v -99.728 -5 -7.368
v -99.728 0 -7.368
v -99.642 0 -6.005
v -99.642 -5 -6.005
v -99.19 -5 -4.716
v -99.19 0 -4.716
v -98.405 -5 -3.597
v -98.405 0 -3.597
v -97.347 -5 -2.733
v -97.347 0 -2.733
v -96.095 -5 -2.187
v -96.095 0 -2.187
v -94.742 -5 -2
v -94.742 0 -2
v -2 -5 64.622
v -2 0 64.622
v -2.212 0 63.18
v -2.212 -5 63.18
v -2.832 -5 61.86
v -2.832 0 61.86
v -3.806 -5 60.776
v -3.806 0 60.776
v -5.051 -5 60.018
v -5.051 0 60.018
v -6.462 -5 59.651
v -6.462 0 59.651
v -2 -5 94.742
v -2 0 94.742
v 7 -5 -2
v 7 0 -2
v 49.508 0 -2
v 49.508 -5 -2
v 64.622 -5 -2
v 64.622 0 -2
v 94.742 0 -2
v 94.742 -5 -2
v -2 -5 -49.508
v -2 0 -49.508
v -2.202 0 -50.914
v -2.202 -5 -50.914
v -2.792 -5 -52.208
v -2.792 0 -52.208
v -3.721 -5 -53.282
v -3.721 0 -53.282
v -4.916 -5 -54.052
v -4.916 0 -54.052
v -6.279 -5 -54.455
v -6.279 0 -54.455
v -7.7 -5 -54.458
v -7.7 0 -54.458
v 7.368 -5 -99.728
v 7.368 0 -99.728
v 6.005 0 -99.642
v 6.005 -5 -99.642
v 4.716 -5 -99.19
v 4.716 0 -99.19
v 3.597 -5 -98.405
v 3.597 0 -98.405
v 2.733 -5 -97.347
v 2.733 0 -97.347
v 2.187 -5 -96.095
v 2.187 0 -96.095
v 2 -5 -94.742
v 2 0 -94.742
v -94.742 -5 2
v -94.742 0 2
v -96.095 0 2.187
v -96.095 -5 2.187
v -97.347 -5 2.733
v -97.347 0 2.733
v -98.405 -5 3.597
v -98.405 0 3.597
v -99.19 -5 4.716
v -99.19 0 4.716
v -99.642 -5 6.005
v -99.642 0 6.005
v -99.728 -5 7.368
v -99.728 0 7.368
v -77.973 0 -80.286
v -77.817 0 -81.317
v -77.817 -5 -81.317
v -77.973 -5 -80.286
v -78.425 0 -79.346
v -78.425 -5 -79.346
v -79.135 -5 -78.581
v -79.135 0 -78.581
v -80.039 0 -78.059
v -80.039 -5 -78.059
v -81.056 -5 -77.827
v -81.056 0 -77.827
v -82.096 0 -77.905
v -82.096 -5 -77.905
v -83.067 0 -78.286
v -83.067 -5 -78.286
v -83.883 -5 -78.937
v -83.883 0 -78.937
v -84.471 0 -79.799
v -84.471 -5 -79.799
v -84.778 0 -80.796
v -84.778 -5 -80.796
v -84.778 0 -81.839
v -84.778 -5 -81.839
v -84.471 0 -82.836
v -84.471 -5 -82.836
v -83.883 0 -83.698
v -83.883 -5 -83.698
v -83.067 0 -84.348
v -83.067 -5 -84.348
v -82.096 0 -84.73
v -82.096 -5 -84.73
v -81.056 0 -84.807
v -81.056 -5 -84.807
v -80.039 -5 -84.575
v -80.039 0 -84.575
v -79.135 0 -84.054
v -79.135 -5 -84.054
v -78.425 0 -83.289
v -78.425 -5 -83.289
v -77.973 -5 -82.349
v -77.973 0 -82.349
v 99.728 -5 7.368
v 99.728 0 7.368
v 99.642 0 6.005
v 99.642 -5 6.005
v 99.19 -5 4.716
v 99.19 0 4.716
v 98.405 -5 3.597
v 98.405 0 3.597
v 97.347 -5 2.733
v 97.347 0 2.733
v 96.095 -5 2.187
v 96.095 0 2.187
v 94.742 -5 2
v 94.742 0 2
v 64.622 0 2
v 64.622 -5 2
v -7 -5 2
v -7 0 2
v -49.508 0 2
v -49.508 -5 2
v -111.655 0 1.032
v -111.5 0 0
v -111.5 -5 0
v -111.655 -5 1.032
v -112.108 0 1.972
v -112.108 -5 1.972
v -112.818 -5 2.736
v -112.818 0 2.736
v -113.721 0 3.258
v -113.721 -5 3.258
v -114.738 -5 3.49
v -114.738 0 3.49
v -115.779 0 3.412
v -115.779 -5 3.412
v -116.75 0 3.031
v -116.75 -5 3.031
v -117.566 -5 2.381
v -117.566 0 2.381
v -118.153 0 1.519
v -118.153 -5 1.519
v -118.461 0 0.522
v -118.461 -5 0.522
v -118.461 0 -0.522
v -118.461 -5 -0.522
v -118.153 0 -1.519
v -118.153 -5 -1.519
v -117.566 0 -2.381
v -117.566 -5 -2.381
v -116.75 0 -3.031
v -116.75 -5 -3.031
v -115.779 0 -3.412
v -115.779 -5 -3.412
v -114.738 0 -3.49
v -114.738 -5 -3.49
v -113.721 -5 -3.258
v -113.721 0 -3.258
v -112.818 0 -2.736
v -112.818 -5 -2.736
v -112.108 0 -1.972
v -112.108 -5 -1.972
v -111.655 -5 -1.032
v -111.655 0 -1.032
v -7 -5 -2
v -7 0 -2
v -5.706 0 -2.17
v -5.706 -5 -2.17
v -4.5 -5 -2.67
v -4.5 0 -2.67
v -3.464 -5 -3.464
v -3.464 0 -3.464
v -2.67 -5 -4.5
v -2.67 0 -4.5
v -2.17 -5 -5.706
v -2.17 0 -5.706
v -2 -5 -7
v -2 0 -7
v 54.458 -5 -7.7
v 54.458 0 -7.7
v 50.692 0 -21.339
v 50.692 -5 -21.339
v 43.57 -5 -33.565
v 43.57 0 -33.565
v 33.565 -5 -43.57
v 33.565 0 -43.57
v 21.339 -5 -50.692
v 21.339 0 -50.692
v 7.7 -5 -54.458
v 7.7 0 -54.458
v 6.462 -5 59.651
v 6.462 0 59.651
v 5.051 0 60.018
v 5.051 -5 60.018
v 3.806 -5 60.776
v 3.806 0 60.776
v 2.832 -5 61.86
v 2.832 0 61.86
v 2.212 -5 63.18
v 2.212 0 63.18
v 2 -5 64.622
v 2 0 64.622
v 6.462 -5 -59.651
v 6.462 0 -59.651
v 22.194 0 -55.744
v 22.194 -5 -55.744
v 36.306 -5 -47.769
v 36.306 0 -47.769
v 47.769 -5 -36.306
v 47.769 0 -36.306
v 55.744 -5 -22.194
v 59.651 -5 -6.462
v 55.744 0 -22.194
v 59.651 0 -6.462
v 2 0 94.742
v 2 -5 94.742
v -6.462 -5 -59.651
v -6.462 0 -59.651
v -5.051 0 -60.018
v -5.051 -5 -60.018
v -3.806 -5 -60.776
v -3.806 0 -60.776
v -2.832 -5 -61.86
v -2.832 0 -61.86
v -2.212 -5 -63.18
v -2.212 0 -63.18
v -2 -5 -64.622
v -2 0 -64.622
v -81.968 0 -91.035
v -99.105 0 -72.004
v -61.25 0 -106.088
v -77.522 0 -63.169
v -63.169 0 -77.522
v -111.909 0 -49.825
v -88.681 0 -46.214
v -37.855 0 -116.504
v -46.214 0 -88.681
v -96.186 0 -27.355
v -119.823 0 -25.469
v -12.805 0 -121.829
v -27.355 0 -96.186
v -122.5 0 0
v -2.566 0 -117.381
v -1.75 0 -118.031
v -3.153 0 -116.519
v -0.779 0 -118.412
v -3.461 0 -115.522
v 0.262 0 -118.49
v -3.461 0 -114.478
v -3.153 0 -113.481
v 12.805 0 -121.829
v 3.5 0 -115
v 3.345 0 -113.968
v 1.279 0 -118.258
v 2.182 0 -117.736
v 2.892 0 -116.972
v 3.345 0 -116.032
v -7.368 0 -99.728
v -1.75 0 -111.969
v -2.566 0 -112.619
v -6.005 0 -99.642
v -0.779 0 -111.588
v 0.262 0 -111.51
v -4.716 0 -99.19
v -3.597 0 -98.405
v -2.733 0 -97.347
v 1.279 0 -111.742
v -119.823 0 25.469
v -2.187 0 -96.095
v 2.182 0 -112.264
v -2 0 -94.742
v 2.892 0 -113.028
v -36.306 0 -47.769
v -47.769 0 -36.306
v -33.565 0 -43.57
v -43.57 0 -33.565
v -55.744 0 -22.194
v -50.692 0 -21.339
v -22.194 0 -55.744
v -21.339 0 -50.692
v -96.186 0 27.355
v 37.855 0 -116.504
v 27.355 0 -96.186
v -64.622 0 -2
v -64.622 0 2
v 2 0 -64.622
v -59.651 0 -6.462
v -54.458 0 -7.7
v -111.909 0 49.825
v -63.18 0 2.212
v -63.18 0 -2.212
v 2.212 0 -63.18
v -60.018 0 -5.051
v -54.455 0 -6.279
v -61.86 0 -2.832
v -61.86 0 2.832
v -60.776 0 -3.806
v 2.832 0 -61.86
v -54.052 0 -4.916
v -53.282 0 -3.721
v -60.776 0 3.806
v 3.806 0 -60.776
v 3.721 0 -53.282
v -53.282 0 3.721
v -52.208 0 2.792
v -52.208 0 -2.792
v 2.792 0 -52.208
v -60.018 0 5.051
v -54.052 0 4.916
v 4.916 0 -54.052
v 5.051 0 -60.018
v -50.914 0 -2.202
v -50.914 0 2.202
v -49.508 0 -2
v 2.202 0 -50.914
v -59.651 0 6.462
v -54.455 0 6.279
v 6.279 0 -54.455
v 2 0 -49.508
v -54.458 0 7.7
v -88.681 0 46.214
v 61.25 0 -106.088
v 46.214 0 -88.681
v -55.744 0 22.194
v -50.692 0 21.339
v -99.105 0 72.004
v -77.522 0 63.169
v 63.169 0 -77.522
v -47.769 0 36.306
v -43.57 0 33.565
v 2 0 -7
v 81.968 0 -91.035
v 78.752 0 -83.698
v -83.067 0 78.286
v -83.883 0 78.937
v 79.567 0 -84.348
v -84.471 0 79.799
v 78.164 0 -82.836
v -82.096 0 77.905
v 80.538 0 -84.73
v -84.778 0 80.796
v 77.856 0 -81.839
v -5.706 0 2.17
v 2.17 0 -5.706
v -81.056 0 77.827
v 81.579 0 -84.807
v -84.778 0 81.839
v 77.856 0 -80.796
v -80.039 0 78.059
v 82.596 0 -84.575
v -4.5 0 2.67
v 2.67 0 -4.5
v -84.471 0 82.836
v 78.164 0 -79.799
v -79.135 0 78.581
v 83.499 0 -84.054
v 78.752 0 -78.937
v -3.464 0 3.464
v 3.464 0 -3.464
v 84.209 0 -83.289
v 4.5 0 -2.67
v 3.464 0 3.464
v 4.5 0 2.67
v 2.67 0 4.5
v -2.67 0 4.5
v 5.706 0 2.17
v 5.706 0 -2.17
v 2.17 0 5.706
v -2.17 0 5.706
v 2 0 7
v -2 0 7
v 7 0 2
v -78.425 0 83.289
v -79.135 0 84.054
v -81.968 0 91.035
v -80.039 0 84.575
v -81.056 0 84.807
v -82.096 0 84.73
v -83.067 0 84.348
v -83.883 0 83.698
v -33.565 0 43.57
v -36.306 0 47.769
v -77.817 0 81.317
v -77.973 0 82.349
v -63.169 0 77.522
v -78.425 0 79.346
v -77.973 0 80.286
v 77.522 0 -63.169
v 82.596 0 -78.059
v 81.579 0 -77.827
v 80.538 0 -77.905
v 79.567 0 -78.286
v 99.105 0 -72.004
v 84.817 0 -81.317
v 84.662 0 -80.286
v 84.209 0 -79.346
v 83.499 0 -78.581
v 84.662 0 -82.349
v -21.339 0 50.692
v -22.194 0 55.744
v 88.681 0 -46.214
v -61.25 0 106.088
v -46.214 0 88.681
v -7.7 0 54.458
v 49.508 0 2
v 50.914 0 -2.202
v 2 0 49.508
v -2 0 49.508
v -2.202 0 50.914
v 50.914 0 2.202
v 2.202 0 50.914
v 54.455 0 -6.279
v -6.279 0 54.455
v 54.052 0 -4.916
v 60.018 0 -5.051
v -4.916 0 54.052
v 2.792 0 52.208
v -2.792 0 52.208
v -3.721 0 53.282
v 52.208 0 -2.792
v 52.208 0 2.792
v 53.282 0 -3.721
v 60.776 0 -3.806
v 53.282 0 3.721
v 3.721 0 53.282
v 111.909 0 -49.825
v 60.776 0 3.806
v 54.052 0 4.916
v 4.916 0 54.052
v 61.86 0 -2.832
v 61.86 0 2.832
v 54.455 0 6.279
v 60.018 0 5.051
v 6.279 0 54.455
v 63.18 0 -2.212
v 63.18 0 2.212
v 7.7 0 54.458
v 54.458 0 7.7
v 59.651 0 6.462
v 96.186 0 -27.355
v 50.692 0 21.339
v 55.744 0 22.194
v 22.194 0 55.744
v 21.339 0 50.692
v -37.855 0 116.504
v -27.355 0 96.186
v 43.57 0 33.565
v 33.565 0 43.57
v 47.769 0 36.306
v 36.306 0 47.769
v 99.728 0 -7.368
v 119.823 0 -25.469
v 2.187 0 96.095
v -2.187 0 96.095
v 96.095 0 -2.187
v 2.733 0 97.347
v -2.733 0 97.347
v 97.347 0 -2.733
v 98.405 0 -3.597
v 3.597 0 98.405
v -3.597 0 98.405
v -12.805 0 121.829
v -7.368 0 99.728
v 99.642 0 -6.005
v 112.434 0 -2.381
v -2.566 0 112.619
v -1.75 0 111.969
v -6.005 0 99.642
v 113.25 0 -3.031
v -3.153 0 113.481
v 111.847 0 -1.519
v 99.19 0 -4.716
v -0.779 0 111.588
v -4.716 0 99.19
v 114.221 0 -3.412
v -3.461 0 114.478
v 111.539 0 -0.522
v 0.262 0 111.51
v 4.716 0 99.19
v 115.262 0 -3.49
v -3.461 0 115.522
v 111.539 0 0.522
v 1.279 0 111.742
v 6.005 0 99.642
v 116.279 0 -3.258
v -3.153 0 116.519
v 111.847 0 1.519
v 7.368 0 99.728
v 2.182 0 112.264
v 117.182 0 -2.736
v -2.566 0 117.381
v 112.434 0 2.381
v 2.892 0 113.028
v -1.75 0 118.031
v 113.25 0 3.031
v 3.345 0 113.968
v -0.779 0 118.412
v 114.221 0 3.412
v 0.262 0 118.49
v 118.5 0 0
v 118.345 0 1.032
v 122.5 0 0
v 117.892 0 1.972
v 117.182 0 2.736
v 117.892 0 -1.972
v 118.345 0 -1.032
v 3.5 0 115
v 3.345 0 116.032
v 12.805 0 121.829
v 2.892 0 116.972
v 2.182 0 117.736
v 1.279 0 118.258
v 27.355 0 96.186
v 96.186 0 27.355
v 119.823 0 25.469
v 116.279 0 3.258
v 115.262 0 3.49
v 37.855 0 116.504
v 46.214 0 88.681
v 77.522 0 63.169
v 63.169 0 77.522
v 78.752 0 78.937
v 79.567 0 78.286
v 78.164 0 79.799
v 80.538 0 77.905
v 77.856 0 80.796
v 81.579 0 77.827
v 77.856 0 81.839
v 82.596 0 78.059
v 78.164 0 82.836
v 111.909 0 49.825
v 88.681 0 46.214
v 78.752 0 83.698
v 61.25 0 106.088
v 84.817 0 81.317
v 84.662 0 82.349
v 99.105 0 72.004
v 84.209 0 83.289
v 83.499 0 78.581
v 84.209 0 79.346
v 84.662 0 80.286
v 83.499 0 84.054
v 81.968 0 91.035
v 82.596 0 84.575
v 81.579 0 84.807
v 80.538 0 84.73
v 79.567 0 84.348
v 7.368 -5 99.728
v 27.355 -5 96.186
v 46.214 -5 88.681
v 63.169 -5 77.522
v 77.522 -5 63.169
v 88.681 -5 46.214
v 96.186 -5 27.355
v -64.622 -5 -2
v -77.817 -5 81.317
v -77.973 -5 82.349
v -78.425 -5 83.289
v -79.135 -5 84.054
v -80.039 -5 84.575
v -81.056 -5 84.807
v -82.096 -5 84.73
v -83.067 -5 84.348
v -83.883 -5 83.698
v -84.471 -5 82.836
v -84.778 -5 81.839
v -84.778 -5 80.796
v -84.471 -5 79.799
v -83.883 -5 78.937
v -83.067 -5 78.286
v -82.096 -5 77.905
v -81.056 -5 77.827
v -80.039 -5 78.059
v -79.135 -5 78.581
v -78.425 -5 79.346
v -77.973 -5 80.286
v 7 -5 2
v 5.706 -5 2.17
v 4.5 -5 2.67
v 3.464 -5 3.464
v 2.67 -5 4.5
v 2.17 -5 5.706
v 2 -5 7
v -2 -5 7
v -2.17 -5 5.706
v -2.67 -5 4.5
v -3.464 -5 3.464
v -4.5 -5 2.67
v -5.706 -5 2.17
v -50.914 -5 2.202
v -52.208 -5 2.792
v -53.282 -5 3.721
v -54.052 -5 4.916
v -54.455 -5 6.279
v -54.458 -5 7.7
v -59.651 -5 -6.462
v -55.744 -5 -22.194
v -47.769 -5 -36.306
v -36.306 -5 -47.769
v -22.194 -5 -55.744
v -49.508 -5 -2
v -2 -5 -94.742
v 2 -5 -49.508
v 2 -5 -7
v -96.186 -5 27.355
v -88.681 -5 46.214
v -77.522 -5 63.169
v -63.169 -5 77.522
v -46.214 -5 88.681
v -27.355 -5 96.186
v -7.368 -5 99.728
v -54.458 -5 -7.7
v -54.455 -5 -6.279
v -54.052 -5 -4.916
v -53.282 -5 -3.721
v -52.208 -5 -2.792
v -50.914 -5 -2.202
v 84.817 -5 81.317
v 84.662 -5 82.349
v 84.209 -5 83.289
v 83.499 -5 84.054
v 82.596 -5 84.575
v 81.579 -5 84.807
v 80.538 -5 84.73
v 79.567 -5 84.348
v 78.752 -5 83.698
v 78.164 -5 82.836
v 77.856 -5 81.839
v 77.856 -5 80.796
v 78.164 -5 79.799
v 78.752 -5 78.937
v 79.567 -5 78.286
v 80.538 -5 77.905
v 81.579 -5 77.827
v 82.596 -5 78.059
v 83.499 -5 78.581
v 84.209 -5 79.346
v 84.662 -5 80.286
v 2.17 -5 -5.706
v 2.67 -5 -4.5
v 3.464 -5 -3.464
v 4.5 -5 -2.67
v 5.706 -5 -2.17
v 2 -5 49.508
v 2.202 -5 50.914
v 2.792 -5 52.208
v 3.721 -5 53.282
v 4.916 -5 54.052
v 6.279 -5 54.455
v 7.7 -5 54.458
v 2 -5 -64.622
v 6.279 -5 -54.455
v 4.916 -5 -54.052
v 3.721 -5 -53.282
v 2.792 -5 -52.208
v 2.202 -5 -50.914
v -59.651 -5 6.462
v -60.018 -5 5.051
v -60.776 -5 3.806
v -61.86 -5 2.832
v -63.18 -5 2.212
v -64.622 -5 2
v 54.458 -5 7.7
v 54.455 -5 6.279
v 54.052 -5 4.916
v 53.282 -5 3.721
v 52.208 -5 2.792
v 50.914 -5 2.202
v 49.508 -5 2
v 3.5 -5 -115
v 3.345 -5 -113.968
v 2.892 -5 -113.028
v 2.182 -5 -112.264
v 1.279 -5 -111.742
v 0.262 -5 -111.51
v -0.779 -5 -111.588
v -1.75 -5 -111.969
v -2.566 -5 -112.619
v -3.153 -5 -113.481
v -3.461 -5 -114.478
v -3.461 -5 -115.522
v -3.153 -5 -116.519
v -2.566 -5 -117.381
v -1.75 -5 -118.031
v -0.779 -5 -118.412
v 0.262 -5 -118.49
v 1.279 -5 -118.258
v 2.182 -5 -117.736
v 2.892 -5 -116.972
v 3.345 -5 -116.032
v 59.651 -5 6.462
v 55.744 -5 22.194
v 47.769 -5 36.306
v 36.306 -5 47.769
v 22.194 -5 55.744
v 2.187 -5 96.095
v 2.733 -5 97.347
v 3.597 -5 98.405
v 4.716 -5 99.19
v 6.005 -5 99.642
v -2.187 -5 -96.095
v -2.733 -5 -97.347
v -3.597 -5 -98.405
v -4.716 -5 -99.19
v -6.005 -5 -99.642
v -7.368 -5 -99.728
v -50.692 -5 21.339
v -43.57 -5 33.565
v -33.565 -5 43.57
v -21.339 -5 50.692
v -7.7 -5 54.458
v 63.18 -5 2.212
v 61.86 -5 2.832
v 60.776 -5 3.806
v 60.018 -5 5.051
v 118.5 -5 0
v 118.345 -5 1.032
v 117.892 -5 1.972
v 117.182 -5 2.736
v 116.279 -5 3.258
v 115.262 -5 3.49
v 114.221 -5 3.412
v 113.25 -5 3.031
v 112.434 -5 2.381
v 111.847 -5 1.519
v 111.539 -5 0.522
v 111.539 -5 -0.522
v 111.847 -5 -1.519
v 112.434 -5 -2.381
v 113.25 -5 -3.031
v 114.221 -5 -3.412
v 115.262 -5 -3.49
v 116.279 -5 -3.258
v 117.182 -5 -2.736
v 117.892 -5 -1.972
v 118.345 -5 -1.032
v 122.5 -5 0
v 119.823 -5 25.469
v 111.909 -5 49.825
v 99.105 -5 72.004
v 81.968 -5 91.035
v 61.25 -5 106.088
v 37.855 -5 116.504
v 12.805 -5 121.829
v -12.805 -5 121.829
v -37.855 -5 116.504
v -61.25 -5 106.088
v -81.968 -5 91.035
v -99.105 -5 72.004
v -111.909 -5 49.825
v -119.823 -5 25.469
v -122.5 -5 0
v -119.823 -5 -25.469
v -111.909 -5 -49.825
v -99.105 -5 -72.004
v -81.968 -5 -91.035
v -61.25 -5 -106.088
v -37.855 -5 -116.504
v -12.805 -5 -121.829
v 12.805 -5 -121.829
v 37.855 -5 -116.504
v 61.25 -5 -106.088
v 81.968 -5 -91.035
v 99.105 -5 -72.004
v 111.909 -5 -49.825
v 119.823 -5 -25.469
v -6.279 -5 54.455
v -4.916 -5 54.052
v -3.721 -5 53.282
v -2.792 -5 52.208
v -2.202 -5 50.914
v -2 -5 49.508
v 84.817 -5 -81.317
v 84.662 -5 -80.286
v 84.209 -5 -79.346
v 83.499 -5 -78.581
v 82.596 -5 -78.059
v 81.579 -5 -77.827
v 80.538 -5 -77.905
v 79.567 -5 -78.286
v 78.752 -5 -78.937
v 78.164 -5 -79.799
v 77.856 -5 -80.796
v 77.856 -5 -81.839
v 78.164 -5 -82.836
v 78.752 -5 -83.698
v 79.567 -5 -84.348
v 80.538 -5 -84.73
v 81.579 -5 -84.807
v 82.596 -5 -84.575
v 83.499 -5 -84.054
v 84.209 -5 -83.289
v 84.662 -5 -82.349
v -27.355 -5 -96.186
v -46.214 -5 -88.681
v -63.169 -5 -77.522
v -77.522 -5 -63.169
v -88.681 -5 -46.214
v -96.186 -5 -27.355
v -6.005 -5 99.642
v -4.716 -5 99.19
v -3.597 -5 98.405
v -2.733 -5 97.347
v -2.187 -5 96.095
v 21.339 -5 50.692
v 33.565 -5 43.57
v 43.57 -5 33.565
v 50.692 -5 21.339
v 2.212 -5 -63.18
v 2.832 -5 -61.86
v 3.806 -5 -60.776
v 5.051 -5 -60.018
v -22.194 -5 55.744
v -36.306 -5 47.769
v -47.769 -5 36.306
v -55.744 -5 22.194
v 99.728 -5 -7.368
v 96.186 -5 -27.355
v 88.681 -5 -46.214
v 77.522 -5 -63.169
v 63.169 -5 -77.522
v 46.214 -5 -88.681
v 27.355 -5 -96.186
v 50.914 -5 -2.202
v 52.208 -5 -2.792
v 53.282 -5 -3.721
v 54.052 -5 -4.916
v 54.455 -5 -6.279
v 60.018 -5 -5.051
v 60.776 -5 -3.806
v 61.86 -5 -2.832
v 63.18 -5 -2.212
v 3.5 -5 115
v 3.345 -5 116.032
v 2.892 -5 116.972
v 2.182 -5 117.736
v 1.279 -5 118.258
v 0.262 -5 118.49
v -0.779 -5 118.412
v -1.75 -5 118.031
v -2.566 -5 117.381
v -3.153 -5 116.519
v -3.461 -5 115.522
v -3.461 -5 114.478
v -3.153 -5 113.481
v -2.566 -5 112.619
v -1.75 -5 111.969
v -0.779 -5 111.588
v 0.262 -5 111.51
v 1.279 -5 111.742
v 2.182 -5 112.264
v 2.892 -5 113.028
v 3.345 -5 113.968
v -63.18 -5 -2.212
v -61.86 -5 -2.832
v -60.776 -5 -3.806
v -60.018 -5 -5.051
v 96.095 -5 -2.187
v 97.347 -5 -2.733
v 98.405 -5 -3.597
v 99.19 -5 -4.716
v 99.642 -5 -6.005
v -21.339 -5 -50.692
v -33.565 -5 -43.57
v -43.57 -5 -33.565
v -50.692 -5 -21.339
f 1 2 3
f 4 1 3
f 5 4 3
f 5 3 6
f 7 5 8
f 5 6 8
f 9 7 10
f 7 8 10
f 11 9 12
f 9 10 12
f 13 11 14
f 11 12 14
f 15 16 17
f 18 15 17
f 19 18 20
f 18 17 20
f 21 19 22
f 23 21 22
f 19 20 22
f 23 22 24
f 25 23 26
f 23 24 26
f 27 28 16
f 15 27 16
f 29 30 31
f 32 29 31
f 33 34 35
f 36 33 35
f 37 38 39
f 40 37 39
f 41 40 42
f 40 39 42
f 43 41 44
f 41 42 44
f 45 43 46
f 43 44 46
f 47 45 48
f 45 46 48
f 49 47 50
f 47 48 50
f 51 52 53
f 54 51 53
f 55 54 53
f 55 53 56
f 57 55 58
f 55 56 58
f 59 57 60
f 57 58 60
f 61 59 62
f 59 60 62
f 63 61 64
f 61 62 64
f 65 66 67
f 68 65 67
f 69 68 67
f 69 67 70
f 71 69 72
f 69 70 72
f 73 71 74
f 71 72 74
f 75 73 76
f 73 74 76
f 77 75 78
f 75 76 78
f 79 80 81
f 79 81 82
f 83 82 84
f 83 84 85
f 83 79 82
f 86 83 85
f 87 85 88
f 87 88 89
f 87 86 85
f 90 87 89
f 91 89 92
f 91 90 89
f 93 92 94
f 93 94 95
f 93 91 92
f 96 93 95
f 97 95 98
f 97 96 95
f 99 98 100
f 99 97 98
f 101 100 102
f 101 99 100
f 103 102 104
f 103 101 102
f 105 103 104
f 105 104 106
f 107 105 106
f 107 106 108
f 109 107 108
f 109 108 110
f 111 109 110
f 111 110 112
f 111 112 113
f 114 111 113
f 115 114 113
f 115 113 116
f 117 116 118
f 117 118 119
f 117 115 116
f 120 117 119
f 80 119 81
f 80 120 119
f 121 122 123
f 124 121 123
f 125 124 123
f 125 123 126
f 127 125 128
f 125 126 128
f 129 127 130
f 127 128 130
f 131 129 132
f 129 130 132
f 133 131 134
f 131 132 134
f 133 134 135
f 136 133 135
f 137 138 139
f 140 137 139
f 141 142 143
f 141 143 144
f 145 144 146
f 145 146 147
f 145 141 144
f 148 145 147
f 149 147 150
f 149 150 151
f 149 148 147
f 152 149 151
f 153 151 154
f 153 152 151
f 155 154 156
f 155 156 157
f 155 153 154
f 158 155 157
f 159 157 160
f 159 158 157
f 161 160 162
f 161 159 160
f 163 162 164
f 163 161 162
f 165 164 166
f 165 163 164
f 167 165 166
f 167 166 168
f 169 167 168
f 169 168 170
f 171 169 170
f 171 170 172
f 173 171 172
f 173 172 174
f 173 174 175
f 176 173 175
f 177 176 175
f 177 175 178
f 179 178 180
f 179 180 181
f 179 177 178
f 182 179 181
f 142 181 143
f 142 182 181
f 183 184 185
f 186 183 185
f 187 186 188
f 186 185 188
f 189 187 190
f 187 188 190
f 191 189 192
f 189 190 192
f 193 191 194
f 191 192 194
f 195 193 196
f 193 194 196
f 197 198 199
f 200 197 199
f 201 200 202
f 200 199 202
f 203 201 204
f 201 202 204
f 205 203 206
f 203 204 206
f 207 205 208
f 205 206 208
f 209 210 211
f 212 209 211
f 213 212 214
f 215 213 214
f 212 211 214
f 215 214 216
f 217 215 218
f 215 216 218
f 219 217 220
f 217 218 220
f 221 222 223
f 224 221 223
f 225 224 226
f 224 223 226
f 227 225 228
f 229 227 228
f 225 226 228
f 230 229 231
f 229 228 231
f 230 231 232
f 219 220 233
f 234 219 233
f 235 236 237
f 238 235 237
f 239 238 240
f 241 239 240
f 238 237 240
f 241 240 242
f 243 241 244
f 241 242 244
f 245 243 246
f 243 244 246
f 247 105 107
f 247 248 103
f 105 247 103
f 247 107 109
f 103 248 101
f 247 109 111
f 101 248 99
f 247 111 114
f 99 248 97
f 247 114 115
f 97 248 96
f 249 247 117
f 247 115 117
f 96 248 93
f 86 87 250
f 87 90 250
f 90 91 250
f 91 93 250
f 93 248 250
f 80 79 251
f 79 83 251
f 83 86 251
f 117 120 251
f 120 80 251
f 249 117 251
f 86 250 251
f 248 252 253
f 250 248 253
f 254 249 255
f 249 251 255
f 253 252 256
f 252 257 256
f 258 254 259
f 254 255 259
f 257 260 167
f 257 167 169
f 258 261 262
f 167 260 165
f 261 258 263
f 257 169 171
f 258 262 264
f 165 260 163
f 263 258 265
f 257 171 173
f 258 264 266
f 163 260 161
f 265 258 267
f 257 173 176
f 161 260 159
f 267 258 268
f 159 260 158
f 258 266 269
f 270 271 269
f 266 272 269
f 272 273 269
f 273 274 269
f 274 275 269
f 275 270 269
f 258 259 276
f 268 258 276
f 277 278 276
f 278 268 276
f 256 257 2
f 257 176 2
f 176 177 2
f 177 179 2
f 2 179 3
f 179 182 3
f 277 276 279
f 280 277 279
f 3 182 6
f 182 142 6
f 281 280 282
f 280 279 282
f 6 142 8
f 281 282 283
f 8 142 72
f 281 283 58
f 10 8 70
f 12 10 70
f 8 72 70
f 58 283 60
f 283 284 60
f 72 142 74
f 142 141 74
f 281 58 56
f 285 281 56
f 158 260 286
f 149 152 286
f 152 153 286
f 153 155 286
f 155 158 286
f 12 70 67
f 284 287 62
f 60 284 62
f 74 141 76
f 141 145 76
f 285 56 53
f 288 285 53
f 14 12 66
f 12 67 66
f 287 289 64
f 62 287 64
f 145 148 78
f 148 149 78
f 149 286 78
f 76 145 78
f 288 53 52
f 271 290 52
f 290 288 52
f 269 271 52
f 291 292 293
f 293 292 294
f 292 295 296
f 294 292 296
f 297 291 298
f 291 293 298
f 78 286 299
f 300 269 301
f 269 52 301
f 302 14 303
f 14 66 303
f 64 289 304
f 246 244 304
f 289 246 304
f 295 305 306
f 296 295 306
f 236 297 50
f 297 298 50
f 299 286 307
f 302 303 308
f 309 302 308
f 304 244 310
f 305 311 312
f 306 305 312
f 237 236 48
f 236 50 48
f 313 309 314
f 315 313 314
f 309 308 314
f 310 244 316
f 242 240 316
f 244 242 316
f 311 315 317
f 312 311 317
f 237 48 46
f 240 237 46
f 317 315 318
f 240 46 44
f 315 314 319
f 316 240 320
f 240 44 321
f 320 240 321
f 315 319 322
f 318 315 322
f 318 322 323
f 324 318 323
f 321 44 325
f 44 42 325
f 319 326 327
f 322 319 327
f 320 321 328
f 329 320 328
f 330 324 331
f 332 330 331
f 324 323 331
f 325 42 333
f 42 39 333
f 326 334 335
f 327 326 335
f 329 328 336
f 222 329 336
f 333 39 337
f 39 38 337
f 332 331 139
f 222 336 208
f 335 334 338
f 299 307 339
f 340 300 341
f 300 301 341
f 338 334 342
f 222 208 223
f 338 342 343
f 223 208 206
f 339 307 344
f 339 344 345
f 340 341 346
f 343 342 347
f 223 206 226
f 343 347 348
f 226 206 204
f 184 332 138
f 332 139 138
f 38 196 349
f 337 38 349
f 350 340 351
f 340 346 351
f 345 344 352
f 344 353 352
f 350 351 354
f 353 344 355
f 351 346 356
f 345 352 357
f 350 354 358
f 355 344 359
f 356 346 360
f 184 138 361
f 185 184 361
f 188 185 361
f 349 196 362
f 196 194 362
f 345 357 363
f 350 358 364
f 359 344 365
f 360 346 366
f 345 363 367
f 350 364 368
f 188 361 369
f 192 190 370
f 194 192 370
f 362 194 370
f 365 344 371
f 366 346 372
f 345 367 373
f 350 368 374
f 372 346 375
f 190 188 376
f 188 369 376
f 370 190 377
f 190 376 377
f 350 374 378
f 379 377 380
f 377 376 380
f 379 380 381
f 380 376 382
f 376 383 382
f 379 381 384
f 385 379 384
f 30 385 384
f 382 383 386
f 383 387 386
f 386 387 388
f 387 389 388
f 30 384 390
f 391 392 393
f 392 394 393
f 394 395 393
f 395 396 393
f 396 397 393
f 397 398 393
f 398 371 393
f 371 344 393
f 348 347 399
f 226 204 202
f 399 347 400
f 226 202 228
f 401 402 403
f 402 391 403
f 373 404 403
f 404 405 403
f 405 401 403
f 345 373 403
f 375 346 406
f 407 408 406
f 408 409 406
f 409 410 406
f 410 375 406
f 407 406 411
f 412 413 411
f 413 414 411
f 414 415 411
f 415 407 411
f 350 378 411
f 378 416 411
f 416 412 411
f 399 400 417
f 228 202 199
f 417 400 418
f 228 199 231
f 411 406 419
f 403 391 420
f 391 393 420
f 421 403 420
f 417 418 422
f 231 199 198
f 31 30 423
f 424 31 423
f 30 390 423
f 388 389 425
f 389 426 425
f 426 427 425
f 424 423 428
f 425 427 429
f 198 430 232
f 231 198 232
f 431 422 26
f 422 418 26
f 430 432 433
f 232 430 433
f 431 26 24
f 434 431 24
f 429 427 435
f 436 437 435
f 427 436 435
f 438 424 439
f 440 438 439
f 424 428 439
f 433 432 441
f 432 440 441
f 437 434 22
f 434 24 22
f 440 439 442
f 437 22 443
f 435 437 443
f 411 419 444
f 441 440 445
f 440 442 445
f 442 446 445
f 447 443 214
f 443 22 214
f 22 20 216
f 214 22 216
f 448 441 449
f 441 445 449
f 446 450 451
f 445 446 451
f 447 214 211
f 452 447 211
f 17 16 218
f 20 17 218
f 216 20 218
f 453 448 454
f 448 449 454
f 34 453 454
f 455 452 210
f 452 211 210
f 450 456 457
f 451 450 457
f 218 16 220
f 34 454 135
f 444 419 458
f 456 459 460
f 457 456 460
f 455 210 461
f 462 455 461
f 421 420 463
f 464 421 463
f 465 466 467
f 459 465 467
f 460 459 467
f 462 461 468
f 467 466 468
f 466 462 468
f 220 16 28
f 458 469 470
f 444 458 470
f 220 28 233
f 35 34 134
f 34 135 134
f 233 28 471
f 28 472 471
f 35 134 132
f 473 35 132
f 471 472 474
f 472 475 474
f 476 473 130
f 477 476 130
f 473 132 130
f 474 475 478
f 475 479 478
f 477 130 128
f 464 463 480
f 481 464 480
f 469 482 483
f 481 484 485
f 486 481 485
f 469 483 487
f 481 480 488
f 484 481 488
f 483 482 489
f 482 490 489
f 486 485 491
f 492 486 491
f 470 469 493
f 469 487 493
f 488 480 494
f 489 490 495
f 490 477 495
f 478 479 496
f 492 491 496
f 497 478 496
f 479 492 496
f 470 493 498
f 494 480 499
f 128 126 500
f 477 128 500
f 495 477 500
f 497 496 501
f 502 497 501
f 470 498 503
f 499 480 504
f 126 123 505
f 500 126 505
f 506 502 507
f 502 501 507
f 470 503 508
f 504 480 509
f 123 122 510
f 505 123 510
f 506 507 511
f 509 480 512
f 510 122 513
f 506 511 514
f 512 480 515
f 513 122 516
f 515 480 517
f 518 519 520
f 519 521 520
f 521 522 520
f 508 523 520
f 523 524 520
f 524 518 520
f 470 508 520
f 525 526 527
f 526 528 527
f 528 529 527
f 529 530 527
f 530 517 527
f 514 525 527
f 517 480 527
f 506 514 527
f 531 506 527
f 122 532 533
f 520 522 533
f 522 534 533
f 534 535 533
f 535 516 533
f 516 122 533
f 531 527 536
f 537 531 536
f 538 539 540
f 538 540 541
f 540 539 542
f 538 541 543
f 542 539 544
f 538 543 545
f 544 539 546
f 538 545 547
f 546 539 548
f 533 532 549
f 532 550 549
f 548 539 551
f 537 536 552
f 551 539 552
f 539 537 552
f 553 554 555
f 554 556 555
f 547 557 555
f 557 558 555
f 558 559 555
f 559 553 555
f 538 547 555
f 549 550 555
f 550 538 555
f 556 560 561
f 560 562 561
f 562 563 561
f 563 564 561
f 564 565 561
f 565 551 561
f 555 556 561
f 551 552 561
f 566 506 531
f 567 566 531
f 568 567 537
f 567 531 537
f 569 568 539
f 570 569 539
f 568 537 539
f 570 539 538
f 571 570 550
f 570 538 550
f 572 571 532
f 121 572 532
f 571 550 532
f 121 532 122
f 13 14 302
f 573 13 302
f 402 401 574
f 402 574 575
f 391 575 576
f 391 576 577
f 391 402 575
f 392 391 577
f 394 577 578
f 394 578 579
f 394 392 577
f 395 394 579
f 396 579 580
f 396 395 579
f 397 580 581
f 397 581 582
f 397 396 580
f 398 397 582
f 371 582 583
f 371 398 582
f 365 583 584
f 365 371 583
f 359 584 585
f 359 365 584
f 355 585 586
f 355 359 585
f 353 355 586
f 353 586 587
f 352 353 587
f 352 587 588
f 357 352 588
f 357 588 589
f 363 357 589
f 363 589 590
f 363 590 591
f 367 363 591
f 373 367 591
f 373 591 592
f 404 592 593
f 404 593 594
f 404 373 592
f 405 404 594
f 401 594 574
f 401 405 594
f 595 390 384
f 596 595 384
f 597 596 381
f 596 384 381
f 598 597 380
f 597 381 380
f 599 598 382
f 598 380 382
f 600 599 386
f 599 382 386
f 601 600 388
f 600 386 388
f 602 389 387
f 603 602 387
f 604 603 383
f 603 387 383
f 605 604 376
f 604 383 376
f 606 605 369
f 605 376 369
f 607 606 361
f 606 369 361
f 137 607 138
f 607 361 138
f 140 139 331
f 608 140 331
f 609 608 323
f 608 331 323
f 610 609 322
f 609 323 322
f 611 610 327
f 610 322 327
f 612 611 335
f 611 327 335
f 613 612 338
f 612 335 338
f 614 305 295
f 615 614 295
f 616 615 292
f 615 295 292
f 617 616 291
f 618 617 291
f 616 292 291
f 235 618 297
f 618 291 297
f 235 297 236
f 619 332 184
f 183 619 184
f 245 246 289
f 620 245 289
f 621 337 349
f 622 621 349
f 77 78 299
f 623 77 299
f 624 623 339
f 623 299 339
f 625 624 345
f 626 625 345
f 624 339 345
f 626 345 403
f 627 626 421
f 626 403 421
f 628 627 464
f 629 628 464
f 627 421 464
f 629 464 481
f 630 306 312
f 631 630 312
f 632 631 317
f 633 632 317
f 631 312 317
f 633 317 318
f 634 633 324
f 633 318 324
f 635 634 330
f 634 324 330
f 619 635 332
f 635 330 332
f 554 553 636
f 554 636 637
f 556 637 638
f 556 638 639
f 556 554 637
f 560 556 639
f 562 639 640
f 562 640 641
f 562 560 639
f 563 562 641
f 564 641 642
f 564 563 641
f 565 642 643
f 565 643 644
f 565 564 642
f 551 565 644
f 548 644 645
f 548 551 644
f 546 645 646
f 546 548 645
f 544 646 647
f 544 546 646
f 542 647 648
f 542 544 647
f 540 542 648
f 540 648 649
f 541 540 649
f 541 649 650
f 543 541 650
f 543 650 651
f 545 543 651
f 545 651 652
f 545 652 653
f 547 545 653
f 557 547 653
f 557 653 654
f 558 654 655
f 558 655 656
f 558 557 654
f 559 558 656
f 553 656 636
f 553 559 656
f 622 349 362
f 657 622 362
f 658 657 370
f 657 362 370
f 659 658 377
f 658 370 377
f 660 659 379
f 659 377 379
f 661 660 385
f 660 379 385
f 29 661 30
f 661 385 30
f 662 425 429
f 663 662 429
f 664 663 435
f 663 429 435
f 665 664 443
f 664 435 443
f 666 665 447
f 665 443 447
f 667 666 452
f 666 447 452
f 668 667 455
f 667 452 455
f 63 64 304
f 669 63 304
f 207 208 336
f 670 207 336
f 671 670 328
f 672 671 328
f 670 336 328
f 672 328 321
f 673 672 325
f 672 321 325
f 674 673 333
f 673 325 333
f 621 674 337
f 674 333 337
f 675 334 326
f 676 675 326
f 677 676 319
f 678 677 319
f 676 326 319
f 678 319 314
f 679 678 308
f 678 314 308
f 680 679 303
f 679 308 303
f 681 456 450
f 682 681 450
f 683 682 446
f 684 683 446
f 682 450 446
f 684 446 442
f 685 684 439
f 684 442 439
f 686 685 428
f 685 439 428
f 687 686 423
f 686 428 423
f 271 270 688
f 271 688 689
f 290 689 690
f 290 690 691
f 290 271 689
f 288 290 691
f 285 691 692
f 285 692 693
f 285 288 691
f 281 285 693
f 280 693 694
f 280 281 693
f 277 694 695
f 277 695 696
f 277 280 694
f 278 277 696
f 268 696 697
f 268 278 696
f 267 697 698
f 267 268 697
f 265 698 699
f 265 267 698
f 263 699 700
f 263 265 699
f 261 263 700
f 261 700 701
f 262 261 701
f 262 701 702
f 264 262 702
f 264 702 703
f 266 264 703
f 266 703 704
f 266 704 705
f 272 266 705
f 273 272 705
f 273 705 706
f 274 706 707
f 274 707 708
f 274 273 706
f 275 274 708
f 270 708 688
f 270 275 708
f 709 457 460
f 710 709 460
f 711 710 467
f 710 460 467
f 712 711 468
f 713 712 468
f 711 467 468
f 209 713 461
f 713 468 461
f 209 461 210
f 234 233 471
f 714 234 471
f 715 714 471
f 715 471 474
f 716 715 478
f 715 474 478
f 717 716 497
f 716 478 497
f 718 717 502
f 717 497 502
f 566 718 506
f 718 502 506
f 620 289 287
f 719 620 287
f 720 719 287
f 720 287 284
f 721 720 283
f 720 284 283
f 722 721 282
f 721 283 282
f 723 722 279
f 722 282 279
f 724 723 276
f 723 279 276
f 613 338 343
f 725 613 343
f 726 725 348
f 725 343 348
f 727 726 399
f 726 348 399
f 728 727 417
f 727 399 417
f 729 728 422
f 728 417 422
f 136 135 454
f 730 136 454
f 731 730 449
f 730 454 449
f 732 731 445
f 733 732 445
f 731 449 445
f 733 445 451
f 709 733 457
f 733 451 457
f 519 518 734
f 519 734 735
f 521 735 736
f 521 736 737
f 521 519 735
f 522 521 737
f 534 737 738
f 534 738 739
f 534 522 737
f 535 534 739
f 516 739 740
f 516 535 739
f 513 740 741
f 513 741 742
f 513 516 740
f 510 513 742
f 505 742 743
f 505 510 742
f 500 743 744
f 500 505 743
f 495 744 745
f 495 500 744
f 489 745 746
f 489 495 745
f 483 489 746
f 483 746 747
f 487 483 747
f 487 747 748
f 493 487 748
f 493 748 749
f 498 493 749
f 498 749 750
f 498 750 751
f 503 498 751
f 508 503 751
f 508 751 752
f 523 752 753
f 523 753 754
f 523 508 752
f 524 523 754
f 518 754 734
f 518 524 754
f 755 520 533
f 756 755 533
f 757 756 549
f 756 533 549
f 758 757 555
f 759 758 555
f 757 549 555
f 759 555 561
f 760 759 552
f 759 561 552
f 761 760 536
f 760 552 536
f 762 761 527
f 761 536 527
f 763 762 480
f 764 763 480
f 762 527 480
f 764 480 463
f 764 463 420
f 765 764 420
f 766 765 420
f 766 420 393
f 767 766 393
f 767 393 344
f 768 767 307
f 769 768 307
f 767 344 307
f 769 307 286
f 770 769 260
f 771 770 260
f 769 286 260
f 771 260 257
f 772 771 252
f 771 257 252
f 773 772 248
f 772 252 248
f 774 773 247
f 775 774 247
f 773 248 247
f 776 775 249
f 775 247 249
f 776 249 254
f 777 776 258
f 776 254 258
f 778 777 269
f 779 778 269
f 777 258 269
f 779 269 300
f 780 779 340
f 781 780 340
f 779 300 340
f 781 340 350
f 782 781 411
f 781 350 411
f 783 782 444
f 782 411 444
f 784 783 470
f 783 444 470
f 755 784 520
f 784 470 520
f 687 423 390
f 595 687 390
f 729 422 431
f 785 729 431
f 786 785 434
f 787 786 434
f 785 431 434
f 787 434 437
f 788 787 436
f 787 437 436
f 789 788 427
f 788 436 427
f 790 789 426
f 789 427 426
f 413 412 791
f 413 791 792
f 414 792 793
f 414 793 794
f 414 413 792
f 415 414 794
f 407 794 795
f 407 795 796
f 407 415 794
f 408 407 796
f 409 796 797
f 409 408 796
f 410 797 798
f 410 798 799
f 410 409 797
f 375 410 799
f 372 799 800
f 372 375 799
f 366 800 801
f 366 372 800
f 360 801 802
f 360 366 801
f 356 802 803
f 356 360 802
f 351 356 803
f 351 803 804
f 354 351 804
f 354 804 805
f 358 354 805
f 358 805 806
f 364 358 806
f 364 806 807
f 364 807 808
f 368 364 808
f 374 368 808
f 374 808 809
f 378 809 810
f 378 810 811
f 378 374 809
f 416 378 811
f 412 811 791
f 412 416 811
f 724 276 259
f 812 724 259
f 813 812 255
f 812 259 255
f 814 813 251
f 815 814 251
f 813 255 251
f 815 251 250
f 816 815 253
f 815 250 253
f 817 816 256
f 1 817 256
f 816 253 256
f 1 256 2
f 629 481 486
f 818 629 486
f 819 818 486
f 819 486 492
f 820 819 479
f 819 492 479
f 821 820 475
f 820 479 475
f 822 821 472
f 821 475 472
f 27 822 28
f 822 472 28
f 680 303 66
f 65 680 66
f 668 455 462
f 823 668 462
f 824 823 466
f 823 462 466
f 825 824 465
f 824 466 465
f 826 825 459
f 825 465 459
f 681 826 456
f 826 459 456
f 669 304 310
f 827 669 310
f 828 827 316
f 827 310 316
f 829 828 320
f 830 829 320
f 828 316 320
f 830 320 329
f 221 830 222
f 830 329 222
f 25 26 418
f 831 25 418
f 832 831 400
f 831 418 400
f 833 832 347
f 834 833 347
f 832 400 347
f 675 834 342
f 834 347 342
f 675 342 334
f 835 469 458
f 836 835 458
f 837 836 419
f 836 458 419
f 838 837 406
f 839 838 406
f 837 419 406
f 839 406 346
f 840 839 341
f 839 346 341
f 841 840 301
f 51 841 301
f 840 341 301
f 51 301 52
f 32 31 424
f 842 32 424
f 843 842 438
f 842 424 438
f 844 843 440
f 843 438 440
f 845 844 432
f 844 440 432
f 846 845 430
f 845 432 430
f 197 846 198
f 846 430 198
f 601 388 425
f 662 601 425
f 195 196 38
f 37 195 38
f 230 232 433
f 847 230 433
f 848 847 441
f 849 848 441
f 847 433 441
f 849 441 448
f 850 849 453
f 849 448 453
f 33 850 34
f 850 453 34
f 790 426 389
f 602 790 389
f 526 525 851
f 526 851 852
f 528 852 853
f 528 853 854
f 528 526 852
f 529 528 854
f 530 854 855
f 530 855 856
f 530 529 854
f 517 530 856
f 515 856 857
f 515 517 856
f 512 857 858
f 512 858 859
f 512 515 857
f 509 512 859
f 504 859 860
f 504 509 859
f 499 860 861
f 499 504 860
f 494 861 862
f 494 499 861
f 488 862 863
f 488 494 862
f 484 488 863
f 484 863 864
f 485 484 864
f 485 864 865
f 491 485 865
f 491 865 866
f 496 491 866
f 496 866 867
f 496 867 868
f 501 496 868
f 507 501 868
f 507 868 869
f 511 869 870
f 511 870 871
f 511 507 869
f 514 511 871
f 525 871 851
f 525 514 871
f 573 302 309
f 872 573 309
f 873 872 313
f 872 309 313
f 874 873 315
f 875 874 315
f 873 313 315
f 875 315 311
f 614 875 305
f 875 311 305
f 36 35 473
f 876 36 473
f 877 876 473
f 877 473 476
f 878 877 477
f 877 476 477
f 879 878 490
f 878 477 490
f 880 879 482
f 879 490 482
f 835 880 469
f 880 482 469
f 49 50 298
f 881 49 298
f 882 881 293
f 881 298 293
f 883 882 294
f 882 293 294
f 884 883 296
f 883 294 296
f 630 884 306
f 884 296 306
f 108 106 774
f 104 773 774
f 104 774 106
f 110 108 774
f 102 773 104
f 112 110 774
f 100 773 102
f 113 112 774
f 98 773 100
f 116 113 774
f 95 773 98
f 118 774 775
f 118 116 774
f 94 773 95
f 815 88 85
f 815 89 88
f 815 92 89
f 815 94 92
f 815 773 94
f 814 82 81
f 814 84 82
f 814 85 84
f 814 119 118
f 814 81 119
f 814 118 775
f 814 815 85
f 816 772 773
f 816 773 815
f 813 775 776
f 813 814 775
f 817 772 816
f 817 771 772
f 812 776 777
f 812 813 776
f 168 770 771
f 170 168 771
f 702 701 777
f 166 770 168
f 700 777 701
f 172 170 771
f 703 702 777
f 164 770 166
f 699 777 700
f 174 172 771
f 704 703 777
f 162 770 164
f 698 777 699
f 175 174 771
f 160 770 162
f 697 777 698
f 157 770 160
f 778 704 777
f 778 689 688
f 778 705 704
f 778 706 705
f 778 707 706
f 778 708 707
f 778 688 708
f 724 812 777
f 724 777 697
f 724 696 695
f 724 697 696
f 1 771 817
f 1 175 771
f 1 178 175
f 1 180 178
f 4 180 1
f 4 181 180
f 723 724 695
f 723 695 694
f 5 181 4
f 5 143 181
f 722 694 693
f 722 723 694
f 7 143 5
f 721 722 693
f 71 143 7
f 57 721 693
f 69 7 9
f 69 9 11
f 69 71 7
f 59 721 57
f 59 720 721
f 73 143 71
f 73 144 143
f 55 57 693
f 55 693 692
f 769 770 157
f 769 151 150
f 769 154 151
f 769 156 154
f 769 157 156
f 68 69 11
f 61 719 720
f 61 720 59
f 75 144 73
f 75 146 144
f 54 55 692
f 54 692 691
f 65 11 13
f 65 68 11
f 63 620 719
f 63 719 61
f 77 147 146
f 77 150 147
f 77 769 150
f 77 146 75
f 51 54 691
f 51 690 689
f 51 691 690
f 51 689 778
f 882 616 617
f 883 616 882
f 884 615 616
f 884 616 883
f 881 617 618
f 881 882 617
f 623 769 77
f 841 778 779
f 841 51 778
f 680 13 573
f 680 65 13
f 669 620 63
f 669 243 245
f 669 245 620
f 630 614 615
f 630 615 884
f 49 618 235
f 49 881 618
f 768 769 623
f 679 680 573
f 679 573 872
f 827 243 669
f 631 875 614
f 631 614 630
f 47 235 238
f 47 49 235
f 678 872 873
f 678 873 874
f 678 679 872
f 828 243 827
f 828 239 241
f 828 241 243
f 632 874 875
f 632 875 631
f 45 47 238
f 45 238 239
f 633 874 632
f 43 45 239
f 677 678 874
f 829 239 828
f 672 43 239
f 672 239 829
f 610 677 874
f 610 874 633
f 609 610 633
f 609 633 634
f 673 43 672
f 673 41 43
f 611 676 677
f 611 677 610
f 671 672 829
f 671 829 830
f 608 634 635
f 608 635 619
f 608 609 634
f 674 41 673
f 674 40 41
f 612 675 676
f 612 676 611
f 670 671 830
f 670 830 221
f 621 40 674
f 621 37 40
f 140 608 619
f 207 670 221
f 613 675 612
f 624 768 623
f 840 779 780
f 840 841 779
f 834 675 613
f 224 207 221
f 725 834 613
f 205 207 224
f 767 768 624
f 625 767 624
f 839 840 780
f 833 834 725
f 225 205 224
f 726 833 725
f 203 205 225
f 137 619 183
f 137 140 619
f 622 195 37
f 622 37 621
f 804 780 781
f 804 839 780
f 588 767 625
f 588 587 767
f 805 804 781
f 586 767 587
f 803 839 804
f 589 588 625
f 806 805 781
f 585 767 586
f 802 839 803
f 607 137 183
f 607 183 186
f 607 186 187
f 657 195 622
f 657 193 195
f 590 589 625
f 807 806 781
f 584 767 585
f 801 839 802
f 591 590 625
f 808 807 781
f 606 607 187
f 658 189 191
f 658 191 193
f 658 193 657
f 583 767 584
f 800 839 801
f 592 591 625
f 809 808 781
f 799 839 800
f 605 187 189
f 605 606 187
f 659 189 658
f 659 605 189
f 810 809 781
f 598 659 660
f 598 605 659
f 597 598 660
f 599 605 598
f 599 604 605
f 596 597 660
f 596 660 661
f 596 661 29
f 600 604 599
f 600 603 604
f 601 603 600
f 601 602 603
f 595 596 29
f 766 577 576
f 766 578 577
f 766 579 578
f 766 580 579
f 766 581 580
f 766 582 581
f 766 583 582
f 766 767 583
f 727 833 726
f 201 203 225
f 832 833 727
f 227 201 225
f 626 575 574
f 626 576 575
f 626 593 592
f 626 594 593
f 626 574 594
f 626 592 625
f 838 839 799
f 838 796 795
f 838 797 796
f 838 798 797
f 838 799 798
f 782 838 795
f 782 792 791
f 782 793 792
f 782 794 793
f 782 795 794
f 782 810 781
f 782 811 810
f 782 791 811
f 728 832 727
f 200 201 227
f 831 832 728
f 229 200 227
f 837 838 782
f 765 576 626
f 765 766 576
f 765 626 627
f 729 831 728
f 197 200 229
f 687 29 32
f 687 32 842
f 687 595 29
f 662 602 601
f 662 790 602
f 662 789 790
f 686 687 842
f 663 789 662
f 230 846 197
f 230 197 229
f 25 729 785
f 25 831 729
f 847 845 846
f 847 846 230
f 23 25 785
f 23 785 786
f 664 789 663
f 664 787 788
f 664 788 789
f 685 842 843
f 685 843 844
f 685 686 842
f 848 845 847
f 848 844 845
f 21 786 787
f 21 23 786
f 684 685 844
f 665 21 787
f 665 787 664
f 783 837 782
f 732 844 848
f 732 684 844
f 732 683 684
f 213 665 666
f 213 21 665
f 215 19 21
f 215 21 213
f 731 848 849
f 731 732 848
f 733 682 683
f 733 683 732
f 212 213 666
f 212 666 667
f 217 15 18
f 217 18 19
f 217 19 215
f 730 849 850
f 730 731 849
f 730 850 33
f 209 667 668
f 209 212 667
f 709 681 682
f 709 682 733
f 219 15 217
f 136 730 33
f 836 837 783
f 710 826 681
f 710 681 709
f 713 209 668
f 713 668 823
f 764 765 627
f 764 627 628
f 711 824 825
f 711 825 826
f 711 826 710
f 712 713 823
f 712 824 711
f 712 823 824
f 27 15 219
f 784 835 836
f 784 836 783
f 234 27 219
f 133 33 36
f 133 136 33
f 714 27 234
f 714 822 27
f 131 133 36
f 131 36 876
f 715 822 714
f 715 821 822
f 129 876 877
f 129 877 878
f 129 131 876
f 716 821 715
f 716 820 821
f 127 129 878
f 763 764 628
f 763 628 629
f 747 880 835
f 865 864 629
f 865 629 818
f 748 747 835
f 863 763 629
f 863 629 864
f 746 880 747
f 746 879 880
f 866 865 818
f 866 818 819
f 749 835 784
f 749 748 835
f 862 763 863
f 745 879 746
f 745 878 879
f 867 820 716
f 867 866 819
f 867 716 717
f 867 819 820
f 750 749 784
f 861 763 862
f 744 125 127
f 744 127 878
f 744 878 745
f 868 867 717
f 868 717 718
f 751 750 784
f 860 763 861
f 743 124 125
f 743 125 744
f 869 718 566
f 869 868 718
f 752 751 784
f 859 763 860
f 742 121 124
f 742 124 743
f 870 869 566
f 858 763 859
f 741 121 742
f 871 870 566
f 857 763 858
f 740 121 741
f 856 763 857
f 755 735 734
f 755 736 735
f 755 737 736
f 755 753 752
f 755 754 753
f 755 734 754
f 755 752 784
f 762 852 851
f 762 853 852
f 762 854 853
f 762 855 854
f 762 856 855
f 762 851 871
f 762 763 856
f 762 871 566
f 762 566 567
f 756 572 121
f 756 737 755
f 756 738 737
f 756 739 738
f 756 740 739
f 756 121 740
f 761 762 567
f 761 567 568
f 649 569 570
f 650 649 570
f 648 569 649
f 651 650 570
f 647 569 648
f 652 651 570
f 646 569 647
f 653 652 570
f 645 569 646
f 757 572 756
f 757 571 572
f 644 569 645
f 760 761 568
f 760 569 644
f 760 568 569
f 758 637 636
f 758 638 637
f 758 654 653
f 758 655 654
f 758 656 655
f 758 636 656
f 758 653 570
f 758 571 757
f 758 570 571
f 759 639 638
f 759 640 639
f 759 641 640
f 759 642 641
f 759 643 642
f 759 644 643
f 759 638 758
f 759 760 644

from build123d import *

# Parameters (mm, degrees)
F0_R     = 122.5
F0_R_2   = 3.5
F1_DEPTH = 5


# Not quite as in the source:
# - a feature names something its author has since deleted; it is built from what else it names


with BuildPart() as f1:
    # F0 (on Front) → F1 (new body)
    with BuildSketch(Plane.XZ):
        Circle(F0_R)
        with Locations((-81.3172798365, -81.3172798365)):
            Circle(F0_R_2, mode=Mode.SUBTRACT)
        with BuildLine():
            ThreePointArc((-99.7281623775, -7.3684210526), (-98.4052297439, -3.5972147631), (-94.7417542586, -2))
            Line((-94.7417542586, -2), (-64.6219776856, -2))
            ThreePointArc((-64.6219776856, -2), (-61.2822402478, -3.2789579623), (-59.6510563252, -6.4615384615))
            ThreePointArc((-59.6510563252, -6.4615384615), (-42.4264068712, -42.4264068712), (-6.4615384615, -59.6510563252))
            ThreePointArc((-6.4615384615, -59.6510563252), (-3.2789579623, -61.2822402478), (-2, -64.6219776856))
            Line((-2, -64.6219776856), (-2, -94.7417542586))
            ThreePointArc((-2, -94.7417542586), (-3.5972147631, -98.4052297439), (-7.3684210526, -99.7281623775))
            ThreePointArc((-7.3684210526, -99.7281623775), (-70.7106781187, -70.7106781187), (-99.7281623775, -7.3684210526))
        make_face(mode=Mode.SUBTRACT)
        with BuildLine():
            ThreePointArc((-7, -2), (-3.4644660941, -3.4644660941), (-2, -7))
            Line((-2, -7), (-2, -49.5075751779))
            ThreePointArc((-2, -49.5075751779), (-3.7212807378, -53.2824923956), (-7.7, -54.4583326957))
            ThreePointArc((-7.7, -54.4583326957), (-38.8908729653, -38.8908729653), (-54.4583326957, -7.7))
            ThreePointArc((-54.4583326957, -7.7), (-53.2824923956, -3.7212807378), (-49.5075751779, -2))
            Line((-49.5075751779, -2), (-7, -2))
        make_face(mode=Mode.SUBTRACT)
        with Locations((0, -115)):
            Circle(F0_R_2, mode=Mode.SUBTRACT)
        with Locations((81.3172798365, -81.3172798365)):
            Circle(F0_R_2, mode=Mode.SUBTRACT)
        with BuildLine():
            ThreePointArc((99.7281623775, -7.3684210526), (70.7106781187, -70.7106781187), (7.3684210526, -99.7281623775))
            ThreePointArc((7.3684210526, -99.7281623775), (3.5972147631, -98.4052297439), (2, -94.7417542586))
            Line((2, -94.7417542586), (2, -64.6219776856))
            ThreePointArc((2, -64.6219776856), (3.2789579623, -61.2822402478), (6.4615384615, -59.6510563252))
            ThreePointArc((6.4615384615, -59.6510563252), (42.4264068712, -42.4264068712), (59.6510563252, -6.4615384615))
            ThreePointArc((59.6510563252, -6.4615384615), (61.2822402478, -3.2789579623), (64.6219776856, -2))
            Line((64.6219776856, -2), (94.7417542586, -2))
            ThreePointArc((94.7417542586, -2), (98.4052297439, -3.5972147631), (99.7281623775, -7.3684210526))
        make_face(mode=Mode.SUBTRACT)
        with BuildLine():
            Line((2, -49.5075751779), (2, -7))
            ThreePointArc((2, -7), (3.4644660941, -3.4644660941), (7, -2))
            Line((7, -2), (49.5075751779, -2))
            ThreePointArc((49.5075751779, -2), (53.2824923956, -3.7212807378), (54.4583326957, -7.7))
            ThreePointArc((54.4583326957, -7.7), (38.8908729653, -38.8908729653), (7.7, -54.4583326957))
            ThreePointArc((7.7, -54.4583326957), (3.7212807378, -53.2824923956), (2, -49.5075751779))
        make_face(mode=Mode.SUBTRACT)
        with Locations((-115, 0)):
            Circle(F0_R_2, mode=Mode.SUBTRACT)
        with BuildLine():
            ThreePointArc((-2, 7), (-3.4644660941, 3.4644660941), (-7, 2))
            Line((-7, 2), (-49.5075751779, 2))
            ThreePointArc((-49.5075751779, 2), (-53.2824923956, 3.7212807378), (-54.4583326957, 7.7))
            ThreePointArc((-54.4583326957, 7.7), (-38.8908729653, 38.8908729653), (-7.7, 54.4583326957))
            ThreePointArc((-7.7, 54.4583326957), (-3.7212807378, 53.2824923956), (-2, 49.5075751779))
            Line((-2, 49.5075751779), (-2, 7))
        make_face(mode=Mode.SUBTRACT)
        with BuildLine():
            ThreePointArc((-99.7281623775, 7.3684210526), (-70.7106781187, 70.7106781187), (-7.3684210526, 99.7281623775))
            ThreePointArc((-7.3684210526, 99.7281623775), (-3.5972147631, 98.4052297439), (-2, 94.7417542586))
            Line((-2, 94.7417542586), (-2, 64.6219776856))
            ThreePointArc((-2, 64.6219776856), (-3.2789579623, 61.2822402478), (-6.4615384615, 59.6510563252))
            ThreePointArc((-6.4615384615, 59.6510563252), (-42.4264068712, 42.4264068712), (-59.6510563252, 6.4615384615))
            ThreePointArc((-59.6510563252, 6.4615384615), (-61.2822402478, 3.2789579623), (-64.6219776856, 2))
            Line((-64.6219776856, 2), (-94.7417542586, 2))
            ThreePointArc((-94.7417542586, 2), (-98.4052297439, 3.5972147631), (-99.7281623775, 7.3684210526))
        make_face(mode=Mode.SUBTRACT)
        with Locations((-81.3172798365, 81.3172798365)):
            Circle(F0_R_2, mode=Mode.SUBTRACT)
        with BuildLine():
            Line((49.5075751779, 2), (7, 2))
            ThreePointArc((7, 2), (3.4644660941, 3.4644660941), (2, 7))
            Line((2, 7), (2, 49.5075751779))
            ThreePointArc((2, 49.5075751779), (3.7212807378, 53.2824923956), (7.7, 54.4583326957))
            ThreePointArc((7.7, 54.4583326957), (38.8908729653, 38.8908729653), (54.4583326957, 7.7))
            ThreePointArc((54.4583326957, 7.7), (53.2824923956, 3.7212807378), (49.5075751779, 2))
        make_face(mode=Mode.SUBTRACT)
        with BuildLine():
            Line((2, 64.6219776856), (2, 94.7417542586))
            ThreePointArc((2, 94.7417542586), (3.5972147631, 98.4052297439), (7.3684210526, 99.7281623775))
            ThreePointArc((7.3684210526, 99.7281623775), (70.7106781187, 70.7106781187), (99.7281623775, 7.3684210526))
            ThreePointArc((99.7281623775, 7.3684210526), (98.4052297439, 3.5972147631), (94.7417542586, 2))
            Line((94.7417542586, 2), (64.6219776856, 2))
            ThreePointArc((64.6219776856, 2), (61.2822402478, 3.2789579623), (59.6510563252, 6.4615384615))
            ThreePointArc((59.6510563252, 6.4615384615), (42.4264068712, 42.4264068712), (6.4615384615, 59.6510563252))
            ThreePointArc((6.4615384615, 59.6510563252), (3.2789579623, 61.2822402478), (2, 64.6219776856))
        make_face(mode=Mode.SUBTRACT)
        with Locations((115, 0)):
            Circle(F0_R_2, mode=Mode.SUBTRACT)
        with Locations((0, 115)):
            Circle(F0_R_2, mode=Mode.SUBTRACT)
        with Locations((81.3172798365, 81.3172798365)):
            Circle(F0_R_2, mode=Mode.SUBTRACT)
    extrude(amount=F1_DEPTH)


solid = f1.part
